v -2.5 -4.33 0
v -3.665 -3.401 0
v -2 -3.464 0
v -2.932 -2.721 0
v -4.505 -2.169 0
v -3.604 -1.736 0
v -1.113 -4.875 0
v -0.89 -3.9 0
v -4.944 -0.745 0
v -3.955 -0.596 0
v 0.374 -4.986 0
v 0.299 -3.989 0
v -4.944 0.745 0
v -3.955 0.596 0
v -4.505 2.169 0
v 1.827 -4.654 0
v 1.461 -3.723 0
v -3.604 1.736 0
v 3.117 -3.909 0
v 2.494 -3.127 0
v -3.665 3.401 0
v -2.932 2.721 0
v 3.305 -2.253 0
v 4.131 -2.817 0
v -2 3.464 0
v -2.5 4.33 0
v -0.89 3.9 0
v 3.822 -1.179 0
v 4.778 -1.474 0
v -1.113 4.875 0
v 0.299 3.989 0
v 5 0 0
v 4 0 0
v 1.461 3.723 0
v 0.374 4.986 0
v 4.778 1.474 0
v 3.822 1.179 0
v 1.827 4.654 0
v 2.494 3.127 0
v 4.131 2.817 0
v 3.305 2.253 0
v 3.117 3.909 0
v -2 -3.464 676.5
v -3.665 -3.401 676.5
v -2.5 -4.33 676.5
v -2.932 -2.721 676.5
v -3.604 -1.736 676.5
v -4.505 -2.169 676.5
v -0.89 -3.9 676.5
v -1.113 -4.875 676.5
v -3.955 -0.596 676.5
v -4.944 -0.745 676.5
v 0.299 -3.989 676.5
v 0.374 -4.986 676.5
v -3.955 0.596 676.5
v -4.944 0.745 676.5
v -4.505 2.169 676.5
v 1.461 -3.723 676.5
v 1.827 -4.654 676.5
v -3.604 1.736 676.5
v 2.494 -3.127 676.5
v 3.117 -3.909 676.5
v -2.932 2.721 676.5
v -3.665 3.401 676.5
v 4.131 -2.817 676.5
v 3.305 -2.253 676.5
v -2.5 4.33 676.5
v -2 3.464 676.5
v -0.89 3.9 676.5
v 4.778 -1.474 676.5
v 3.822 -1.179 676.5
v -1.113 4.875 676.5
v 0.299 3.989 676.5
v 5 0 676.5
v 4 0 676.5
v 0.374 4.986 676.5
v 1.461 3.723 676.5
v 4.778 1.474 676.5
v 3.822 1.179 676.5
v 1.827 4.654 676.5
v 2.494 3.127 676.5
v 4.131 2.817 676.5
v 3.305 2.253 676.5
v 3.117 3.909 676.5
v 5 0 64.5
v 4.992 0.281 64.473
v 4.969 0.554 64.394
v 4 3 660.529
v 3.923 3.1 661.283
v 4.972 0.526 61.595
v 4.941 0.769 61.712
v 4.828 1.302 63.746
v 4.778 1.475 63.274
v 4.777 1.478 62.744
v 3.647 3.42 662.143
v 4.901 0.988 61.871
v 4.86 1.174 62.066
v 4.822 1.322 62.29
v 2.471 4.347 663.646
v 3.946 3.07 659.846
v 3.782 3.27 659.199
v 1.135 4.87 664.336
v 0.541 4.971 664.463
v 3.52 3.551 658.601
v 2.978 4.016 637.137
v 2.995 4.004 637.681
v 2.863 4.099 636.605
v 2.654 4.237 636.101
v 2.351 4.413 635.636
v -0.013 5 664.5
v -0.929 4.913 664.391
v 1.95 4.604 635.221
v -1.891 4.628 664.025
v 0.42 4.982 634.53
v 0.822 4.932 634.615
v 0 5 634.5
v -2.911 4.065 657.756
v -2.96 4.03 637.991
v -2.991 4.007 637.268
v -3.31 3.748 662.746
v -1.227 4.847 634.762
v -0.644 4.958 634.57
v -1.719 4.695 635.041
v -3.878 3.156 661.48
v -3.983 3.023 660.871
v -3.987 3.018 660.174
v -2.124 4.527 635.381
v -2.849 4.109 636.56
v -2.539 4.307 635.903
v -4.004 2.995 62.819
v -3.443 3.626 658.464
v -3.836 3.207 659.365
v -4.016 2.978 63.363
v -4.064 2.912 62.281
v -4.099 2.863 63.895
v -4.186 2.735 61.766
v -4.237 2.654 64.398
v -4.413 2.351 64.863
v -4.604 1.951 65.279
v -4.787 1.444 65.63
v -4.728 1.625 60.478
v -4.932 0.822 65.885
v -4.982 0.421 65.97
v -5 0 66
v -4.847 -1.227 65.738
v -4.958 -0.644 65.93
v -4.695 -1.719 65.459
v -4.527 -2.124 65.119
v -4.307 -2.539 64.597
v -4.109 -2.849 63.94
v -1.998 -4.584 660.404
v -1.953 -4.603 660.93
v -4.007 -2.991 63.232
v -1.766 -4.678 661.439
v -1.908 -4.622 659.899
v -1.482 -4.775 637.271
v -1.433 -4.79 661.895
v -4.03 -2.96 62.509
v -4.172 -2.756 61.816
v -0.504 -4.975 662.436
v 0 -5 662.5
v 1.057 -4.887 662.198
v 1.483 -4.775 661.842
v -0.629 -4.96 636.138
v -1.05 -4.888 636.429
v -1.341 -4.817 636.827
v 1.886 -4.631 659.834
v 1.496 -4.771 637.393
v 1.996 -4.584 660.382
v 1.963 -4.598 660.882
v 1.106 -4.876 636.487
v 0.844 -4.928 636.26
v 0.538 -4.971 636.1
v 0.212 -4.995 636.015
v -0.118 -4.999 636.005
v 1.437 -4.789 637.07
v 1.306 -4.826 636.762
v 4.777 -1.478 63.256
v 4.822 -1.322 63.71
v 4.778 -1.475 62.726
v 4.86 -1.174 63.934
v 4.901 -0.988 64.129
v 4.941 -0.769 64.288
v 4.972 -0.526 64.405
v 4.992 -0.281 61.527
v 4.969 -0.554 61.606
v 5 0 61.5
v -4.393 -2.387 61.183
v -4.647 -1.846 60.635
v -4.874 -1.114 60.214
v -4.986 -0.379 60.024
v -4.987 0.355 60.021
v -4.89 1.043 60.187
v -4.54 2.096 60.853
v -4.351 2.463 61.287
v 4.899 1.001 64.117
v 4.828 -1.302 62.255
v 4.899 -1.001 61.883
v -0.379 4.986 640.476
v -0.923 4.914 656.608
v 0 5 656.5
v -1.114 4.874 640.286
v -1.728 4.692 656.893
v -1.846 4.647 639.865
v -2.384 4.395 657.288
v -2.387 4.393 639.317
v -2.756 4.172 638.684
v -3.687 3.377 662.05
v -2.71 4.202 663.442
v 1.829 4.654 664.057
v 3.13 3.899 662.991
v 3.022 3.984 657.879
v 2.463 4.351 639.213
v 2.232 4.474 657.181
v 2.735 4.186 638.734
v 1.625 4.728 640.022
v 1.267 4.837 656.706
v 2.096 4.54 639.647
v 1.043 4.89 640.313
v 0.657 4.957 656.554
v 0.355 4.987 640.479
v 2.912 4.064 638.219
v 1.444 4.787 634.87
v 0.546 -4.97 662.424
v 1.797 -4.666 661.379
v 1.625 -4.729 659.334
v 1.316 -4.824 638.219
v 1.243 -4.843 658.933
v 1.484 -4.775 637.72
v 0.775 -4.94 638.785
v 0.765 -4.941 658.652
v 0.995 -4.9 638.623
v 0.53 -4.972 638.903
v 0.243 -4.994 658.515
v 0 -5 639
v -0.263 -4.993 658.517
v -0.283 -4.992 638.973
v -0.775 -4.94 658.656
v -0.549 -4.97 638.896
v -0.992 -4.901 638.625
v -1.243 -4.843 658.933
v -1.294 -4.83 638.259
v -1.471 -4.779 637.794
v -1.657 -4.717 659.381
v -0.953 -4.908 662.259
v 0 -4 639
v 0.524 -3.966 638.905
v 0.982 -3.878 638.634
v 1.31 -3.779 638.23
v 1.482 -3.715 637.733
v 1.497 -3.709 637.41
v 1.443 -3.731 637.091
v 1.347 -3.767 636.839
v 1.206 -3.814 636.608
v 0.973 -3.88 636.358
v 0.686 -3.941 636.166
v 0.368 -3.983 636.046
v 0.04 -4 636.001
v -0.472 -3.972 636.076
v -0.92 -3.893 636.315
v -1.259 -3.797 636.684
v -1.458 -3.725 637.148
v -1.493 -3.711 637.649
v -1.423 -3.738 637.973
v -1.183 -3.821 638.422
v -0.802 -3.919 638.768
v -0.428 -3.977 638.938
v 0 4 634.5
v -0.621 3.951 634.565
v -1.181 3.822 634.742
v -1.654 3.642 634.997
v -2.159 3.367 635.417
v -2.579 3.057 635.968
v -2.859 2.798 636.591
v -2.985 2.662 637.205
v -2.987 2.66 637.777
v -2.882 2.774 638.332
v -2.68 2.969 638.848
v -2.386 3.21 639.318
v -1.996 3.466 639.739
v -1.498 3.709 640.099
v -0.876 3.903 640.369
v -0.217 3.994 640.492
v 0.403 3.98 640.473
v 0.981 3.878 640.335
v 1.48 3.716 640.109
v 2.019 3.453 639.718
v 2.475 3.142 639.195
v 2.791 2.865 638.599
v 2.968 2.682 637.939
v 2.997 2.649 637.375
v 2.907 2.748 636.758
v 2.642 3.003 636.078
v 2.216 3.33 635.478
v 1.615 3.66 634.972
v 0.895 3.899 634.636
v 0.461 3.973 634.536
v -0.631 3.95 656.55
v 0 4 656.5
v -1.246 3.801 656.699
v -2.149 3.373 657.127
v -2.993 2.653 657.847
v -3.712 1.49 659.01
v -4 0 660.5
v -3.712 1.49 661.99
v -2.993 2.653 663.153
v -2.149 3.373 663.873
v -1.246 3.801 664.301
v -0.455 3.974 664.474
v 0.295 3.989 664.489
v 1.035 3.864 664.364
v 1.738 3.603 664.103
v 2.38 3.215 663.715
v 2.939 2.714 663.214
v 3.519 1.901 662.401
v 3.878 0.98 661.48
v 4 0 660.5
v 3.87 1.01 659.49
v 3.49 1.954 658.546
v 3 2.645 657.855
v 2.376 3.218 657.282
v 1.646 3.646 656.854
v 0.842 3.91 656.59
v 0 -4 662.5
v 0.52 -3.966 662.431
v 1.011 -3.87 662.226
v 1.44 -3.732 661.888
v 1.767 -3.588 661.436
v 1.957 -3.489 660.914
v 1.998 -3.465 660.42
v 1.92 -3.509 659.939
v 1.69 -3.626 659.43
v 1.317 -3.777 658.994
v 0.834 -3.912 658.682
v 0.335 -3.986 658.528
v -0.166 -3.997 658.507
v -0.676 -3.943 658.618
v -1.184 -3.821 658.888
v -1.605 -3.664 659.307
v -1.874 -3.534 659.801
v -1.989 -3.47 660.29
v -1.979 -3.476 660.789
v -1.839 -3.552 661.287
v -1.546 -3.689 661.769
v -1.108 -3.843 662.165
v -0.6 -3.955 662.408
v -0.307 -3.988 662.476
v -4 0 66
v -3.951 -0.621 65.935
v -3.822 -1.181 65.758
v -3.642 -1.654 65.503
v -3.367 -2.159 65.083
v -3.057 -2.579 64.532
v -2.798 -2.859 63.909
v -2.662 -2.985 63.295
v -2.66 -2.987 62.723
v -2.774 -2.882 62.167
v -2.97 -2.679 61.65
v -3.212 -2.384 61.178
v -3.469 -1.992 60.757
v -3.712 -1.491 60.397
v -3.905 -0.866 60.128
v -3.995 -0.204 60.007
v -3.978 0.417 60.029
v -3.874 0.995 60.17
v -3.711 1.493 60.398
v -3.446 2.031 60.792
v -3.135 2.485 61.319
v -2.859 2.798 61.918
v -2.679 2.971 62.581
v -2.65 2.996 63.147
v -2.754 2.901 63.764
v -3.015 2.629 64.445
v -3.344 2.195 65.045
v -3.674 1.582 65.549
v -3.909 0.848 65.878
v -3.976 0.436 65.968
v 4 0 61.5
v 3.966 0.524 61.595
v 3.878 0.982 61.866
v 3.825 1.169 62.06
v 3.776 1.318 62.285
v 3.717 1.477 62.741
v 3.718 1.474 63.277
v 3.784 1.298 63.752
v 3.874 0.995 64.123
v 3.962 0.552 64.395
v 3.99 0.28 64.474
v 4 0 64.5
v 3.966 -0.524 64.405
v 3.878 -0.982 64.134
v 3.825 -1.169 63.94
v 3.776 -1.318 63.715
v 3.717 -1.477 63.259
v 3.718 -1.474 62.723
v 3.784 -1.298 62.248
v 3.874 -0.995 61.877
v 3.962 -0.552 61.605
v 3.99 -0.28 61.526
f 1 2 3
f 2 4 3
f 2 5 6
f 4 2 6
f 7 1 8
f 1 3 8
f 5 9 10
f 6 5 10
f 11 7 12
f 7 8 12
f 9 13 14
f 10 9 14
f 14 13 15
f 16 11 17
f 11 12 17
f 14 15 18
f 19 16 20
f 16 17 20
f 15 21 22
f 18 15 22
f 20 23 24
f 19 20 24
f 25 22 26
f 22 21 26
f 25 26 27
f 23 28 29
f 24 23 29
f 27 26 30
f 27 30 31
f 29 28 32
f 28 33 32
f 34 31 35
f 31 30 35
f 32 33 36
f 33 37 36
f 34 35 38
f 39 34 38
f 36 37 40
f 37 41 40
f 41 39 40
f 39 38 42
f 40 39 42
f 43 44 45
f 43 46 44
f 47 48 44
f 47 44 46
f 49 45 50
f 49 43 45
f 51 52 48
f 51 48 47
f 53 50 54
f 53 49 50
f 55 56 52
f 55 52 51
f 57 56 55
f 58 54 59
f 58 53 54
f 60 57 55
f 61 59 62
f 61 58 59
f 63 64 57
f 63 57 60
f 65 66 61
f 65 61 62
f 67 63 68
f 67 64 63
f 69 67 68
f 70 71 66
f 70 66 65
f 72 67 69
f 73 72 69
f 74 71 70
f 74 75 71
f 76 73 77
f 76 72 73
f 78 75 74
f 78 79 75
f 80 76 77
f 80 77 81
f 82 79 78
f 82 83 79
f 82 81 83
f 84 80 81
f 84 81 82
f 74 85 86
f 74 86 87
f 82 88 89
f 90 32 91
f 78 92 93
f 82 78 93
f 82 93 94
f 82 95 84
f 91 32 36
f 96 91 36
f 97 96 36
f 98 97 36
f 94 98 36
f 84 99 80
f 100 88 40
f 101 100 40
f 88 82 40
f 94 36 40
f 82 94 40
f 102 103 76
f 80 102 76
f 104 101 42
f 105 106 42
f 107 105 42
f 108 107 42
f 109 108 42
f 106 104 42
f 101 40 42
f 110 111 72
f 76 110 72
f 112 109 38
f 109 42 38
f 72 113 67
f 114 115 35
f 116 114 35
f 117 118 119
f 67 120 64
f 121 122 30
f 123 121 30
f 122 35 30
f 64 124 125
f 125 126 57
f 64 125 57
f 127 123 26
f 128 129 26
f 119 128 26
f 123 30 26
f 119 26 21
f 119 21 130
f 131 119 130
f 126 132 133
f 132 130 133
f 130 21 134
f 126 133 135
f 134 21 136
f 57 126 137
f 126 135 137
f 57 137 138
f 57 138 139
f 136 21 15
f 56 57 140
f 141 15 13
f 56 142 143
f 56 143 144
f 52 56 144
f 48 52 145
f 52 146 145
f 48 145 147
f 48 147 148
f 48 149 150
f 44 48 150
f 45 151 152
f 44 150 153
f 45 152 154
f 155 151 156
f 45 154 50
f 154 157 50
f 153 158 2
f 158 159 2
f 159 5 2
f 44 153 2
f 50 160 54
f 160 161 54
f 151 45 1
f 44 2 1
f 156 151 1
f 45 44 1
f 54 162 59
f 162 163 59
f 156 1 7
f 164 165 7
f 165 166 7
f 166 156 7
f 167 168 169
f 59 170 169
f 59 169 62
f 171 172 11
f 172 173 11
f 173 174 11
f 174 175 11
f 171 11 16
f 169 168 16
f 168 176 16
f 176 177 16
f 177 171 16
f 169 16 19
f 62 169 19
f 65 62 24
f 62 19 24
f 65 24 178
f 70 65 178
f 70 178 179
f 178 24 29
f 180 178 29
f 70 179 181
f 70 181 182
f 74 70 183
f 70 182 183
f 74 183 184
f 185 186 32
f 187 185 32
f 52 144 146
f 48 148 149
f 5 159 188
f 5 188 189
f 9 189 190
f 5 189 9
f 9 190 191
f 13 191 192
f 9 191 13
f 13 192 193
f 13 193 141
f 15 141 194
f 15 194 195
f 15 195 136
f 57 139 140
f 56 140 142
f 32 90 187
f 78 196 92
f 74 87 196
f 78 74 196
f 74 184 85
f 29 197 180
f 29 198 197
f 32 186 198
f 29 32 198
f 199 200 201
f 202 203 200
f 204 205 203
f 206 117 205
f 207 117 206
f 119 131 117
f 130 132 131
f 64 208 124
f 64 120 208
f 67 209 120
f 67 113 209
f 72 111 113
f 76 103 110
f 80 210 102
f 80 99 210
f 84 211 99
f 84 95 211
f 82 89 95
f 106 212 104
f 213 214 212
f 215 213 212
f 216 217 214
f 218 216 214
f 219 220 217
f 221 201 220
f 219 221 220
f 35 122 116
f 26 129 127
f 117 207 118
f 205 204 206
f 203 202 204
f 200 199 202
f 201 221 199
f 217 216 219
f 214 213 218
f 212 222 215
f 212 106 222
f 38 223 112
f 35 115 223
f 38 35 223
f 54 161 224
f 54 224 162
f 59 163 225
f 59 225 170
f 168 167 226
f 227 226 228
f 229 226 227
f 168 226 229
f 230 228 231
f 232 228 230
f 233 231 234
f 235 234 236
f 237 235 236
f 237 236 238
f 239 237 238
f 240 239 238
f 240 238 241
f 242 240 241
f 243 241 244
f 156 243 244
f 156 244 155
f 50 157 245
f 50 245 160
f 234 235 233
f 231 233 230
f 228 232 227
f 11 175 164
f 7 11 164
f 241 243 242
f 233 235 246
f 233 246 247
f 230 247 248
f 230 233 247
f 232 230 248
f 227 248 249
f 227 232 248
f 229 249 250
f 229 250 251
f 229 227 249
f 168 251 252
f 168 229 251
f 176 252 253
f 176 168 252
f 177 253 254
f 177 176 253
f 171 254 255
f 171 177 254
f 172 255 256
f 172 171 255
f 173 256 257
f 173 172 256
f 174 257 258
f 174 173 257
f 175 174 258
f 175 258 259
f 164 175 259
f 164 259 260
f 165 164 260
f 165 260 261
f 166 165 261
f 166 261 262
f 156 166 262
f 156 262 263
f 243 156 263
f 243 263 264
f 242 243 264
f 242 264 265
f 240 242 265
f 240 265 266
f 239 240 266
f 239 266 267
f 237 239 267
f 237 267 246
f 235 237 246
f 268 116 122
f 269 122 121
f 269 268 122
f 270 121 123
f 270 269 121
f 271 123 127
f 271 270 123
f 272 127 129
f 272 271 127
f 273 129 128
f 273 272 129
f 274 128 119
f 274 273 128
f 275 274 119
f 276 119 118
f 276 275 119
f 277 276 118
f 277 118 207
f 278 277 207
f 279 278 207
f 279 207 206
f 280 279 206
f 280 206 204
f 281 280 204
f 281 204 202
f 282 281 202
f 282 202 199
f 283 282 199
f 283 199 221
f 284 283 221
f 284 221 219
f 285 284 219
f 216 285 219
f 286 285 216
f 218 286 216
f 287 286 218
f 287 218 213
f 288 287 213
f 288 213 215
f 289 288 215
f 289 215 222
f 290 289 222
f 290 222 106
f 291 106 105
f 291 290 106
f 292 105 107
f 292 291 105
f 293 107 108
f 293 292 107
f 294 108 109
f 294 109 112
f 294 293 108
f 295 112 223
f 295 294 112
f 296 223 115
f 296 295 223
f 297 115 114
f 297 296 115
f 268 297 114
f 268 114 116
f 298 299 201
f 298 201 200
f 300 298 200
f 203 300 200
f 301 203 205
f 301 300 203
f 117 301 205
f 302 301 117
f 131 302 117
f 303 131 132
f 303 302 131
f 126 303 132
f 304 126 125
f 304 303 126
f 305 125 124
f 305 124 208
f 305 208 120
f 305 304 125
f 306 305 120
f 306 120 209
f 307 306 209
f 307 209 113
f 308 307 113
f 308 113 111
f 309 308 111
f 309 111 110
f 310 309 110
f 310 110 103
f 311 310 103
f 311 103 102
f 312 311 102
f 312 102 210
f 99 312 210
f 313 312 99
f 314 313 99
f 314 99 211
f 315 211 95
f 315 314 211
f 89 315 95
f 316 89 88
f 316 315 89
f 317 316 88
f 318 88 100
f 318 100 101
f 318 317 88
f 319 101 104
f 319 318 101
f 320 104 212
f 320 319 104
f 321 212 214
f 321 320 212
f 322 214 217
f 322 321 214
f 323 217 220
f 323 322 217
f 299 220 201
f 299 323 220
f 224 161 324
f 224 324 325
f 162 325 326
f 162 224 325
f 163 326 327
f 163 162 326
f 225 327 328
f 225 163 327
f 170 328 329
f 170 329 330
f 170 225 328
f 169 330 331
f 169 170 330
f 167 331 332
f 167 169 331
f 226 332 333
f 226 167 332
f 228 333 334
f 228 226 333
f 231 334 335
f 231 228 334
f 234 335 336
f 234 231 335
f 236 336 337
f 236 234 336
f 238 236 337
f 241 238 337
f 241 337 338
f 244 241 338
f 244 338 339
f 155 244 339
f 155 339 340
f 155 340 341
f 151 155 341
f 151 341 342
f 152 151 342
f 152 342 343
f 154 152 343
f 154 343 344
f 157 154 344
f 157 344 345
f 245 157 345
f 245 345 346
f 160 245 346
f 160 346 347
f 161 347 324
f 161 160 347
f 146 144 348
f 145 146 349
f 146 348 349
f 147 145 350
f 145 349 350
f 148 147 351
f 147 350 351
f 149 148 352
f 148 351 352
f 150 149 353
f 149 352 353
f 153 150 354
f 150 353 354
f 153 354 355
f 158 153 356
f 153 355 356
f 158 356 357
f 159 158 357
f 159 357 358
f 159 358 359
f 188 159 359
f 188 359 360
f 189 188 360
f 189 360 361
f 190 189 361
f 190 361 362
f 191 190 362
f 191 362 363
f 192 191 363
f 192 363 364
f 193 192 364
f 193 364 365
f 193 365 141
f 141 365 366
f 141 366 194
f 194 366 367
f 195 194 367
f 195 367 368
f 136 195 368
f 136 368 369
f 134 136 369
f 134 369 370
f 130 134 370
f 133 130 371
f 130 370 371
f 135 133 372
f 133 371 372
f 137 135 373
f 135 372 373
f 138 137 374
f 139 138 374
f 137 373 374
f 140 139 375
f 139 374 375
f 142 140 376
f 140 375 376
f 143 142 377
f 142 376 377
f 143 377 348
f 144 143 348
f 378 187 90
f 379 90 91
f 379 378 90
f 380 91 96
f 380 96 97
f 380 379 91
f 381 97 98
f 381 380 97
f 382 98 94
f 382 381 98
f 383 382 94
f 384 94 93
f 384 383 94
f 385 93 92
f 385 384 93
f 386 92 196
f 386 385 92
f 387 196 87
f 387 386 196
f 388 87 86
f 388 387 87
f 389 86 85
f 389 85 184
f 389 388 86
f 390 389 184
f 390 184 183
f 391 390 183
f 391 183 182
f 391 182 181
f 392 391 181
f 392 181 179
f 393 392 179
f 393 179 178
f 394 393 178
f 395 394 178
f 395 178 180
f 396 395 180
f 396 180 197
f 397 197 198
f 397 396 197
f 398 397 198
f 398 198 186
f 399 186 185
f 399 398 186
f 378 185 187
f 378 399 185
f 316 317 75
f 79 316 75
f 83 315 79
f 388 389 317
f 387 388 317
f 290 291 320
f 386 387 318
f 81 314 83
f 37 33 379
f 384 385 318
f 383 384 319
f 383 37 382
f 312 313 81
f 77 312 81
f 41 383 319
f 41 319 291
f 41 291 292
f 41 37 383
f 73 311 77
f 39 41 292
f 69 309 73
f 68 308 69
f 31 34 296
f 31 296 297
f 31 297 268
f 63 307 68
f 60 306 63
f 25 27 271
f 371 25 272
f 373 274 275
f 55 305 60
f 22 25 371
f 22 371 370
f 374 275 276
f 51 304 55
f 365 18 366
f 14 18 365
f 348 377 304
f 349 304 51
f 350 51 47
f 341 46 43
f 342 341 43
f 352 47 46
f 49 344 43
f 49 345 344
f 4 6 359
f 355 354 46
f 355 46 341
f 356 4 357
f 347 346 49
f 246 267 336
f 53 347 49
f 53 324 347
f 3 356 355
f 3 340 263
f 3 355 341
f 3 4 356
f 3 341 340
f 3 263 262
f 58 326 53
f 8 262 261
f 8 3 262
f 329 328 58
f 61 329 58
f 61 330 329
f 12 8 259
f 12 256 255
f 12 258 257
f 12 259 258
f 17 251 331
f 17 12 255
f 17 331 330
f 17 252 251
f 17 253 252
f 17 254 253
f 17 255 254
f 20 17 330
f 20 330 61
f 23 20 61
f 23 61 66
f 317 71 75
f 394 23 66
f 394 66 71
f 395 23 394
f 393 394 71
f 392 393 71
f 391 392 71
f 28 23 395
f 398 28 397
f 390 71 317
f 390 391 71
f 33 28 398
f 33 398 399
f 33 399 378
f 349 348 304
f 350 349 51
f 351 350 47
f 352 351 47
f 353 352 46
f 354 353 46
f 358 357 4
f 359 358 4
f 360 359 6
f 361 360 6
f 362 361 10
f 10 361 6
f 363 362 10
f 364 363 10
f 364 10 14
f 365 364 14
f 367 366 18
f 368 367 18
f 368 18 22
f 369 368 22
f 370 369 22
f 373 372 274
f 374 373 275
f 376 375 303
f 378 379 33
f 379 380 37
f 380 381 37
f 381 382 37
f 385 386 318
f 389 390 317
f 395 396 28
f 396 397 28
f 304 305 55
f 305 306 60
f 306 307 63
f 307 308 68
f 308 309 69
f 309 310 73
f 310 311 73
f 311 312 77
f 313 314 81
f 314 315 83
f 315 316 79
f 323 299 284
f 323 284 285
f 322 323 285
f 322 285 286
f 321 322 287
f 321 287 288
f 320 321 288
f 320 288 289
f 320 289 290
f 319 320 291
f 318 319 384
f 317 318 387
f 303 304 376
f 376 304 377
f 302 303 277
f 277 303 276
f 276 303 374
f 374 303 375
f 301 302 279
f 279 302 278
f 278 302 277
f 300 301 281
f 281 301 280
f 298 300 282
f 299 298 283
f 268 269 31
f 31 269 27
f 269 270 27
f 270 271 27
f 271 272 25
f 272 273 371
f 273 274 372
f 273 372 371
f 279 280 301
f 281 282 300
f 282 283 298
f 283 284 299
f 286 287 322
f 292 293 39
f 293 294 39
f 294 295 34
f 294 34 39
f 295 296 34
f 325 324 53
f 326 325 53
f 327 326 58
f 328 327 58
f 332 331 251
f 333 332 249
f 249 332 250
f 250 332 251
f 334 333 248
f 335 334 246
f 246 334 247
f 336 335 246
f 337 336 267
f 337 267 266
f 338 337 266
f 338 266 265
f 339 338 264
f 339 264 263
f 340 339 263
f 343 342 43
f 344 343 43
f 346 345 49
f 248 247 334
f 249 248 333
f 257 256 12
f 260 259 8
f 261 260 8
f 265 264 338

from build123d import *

# Parameters (mm, degrees)
SKETCH_1_R               = 5
SKETCH_1_R_2             = 4
EXTRUDE_1_DEPTH          = 676.5
CUT_EXTRUDE_1_DEPTH      = 677.536953906
CUT_EXTRUDE_1_DEPTH_BACK = 677.536953906
SKETCH_2_R               = 2
SKETCH_2_R_2             = 1.5
SKETCH_2_3_R             = 4
SKETCH_2_3_R_2           = 3
CUT_EXTRUDE_2_DEPTH      = 677.536954007
CUT_EXTRUDE_3_DEPTH      = 677.536954007
CUT_EXTRUDE_3_DEPTH_BACK = 677.536954007
SKETCH_3_R               = 1.5
SKETCH_3_3_R             = 3
CUT_EXTRUDE_4_DEPTH      = 10


with BuildPart() as part:
    # ｽｹｯﾁ1 → 押し出し-薄板1 (new body)
    with BuildSketch(Plane.XY):
        Circle(SKETCH_1_R)
        Circle(SKETCH_1_R_2, mode=Mode.SUBTRACT)
    extrude(amount=EXTRUDE_1_DEPTH)

    # ｽｹｯﾁ2 → ｶｯﾄ - 押し出し1 (cut, two sides: drawn at the far end of the back side and taken through both)
    with BuildSketch(Plane(origin=(0, 0, 0), x_dir=(1, 0, 0), z_dir=(0, 1, 0)).offset(-CUT_EXTRUDE_1_DEPTH_BACK)):
        with Locations((0, -660.5)):
            Circle(SKETCH_2_R)
        with Locations((0, -637.5)):
            Circle(SKETCH_2_R_2)
    extrude(amount=CUT_EXTRUDE_1_DEPTH + CUT_EXTRUDE_1_DEPTH_BACK, mode=Mode.SUBTRACT)

    # ｽｹｯﾁ2<3> → ｶｯﾄ - 押し出し2 (cut, through all)
    with BuildSketch(Plane(origin=(0, 0, 0), x_dir=(1, 0, 0), z_dir=(0, 1, 0))):
        with Locations((0, -660.5)):
            Circle(SKETCH_2_3_R)
        with Locations((0, -637.5)):
            Circle(SKETCH_2_3_R_2)
    extrude(amount=CUT_EXTRUDE_2_DEPTH, mode=Mode.SUBTRACT)

    # ｽｹｯﾁ3 → ｶｯﾄ - 押し出し3 (cut, two sides: drawn at the far end of the back side and taken through both)
    with BuildSketch(Plane(origin=(0, 0, 0), x_dir=(0, 0, -1), z_dir=(1, 0, 0)).offset(-CUT_EXTRUDE_3_DEPTH_BACK)):
        with Locations((-63, 0)):
            Circle(SKETCH_3_R)
    extrude(amount=CUT_EXTRUDE_3_DEPTH + CUT_EXTRUDE_3_DEPTH_BACK, mode=Mode.SUBTRACT)

    # ｽｹｯﾁ3<3> → ｶｯﾄ - 押し出し4 (cut)
    with BuildSketch(Plane(origin=(0, 0, 0), x_dir=(0, 0, -1), z_dir=(1, 0, 0))):
        with Locations((-63, 0)):
            Circle(SKETCH_3_3_R)
    extrude(amount=-CUT_EXTRUDE_4_DEPTH, mode=Mode.SUBTRACT)


solid = part.part
